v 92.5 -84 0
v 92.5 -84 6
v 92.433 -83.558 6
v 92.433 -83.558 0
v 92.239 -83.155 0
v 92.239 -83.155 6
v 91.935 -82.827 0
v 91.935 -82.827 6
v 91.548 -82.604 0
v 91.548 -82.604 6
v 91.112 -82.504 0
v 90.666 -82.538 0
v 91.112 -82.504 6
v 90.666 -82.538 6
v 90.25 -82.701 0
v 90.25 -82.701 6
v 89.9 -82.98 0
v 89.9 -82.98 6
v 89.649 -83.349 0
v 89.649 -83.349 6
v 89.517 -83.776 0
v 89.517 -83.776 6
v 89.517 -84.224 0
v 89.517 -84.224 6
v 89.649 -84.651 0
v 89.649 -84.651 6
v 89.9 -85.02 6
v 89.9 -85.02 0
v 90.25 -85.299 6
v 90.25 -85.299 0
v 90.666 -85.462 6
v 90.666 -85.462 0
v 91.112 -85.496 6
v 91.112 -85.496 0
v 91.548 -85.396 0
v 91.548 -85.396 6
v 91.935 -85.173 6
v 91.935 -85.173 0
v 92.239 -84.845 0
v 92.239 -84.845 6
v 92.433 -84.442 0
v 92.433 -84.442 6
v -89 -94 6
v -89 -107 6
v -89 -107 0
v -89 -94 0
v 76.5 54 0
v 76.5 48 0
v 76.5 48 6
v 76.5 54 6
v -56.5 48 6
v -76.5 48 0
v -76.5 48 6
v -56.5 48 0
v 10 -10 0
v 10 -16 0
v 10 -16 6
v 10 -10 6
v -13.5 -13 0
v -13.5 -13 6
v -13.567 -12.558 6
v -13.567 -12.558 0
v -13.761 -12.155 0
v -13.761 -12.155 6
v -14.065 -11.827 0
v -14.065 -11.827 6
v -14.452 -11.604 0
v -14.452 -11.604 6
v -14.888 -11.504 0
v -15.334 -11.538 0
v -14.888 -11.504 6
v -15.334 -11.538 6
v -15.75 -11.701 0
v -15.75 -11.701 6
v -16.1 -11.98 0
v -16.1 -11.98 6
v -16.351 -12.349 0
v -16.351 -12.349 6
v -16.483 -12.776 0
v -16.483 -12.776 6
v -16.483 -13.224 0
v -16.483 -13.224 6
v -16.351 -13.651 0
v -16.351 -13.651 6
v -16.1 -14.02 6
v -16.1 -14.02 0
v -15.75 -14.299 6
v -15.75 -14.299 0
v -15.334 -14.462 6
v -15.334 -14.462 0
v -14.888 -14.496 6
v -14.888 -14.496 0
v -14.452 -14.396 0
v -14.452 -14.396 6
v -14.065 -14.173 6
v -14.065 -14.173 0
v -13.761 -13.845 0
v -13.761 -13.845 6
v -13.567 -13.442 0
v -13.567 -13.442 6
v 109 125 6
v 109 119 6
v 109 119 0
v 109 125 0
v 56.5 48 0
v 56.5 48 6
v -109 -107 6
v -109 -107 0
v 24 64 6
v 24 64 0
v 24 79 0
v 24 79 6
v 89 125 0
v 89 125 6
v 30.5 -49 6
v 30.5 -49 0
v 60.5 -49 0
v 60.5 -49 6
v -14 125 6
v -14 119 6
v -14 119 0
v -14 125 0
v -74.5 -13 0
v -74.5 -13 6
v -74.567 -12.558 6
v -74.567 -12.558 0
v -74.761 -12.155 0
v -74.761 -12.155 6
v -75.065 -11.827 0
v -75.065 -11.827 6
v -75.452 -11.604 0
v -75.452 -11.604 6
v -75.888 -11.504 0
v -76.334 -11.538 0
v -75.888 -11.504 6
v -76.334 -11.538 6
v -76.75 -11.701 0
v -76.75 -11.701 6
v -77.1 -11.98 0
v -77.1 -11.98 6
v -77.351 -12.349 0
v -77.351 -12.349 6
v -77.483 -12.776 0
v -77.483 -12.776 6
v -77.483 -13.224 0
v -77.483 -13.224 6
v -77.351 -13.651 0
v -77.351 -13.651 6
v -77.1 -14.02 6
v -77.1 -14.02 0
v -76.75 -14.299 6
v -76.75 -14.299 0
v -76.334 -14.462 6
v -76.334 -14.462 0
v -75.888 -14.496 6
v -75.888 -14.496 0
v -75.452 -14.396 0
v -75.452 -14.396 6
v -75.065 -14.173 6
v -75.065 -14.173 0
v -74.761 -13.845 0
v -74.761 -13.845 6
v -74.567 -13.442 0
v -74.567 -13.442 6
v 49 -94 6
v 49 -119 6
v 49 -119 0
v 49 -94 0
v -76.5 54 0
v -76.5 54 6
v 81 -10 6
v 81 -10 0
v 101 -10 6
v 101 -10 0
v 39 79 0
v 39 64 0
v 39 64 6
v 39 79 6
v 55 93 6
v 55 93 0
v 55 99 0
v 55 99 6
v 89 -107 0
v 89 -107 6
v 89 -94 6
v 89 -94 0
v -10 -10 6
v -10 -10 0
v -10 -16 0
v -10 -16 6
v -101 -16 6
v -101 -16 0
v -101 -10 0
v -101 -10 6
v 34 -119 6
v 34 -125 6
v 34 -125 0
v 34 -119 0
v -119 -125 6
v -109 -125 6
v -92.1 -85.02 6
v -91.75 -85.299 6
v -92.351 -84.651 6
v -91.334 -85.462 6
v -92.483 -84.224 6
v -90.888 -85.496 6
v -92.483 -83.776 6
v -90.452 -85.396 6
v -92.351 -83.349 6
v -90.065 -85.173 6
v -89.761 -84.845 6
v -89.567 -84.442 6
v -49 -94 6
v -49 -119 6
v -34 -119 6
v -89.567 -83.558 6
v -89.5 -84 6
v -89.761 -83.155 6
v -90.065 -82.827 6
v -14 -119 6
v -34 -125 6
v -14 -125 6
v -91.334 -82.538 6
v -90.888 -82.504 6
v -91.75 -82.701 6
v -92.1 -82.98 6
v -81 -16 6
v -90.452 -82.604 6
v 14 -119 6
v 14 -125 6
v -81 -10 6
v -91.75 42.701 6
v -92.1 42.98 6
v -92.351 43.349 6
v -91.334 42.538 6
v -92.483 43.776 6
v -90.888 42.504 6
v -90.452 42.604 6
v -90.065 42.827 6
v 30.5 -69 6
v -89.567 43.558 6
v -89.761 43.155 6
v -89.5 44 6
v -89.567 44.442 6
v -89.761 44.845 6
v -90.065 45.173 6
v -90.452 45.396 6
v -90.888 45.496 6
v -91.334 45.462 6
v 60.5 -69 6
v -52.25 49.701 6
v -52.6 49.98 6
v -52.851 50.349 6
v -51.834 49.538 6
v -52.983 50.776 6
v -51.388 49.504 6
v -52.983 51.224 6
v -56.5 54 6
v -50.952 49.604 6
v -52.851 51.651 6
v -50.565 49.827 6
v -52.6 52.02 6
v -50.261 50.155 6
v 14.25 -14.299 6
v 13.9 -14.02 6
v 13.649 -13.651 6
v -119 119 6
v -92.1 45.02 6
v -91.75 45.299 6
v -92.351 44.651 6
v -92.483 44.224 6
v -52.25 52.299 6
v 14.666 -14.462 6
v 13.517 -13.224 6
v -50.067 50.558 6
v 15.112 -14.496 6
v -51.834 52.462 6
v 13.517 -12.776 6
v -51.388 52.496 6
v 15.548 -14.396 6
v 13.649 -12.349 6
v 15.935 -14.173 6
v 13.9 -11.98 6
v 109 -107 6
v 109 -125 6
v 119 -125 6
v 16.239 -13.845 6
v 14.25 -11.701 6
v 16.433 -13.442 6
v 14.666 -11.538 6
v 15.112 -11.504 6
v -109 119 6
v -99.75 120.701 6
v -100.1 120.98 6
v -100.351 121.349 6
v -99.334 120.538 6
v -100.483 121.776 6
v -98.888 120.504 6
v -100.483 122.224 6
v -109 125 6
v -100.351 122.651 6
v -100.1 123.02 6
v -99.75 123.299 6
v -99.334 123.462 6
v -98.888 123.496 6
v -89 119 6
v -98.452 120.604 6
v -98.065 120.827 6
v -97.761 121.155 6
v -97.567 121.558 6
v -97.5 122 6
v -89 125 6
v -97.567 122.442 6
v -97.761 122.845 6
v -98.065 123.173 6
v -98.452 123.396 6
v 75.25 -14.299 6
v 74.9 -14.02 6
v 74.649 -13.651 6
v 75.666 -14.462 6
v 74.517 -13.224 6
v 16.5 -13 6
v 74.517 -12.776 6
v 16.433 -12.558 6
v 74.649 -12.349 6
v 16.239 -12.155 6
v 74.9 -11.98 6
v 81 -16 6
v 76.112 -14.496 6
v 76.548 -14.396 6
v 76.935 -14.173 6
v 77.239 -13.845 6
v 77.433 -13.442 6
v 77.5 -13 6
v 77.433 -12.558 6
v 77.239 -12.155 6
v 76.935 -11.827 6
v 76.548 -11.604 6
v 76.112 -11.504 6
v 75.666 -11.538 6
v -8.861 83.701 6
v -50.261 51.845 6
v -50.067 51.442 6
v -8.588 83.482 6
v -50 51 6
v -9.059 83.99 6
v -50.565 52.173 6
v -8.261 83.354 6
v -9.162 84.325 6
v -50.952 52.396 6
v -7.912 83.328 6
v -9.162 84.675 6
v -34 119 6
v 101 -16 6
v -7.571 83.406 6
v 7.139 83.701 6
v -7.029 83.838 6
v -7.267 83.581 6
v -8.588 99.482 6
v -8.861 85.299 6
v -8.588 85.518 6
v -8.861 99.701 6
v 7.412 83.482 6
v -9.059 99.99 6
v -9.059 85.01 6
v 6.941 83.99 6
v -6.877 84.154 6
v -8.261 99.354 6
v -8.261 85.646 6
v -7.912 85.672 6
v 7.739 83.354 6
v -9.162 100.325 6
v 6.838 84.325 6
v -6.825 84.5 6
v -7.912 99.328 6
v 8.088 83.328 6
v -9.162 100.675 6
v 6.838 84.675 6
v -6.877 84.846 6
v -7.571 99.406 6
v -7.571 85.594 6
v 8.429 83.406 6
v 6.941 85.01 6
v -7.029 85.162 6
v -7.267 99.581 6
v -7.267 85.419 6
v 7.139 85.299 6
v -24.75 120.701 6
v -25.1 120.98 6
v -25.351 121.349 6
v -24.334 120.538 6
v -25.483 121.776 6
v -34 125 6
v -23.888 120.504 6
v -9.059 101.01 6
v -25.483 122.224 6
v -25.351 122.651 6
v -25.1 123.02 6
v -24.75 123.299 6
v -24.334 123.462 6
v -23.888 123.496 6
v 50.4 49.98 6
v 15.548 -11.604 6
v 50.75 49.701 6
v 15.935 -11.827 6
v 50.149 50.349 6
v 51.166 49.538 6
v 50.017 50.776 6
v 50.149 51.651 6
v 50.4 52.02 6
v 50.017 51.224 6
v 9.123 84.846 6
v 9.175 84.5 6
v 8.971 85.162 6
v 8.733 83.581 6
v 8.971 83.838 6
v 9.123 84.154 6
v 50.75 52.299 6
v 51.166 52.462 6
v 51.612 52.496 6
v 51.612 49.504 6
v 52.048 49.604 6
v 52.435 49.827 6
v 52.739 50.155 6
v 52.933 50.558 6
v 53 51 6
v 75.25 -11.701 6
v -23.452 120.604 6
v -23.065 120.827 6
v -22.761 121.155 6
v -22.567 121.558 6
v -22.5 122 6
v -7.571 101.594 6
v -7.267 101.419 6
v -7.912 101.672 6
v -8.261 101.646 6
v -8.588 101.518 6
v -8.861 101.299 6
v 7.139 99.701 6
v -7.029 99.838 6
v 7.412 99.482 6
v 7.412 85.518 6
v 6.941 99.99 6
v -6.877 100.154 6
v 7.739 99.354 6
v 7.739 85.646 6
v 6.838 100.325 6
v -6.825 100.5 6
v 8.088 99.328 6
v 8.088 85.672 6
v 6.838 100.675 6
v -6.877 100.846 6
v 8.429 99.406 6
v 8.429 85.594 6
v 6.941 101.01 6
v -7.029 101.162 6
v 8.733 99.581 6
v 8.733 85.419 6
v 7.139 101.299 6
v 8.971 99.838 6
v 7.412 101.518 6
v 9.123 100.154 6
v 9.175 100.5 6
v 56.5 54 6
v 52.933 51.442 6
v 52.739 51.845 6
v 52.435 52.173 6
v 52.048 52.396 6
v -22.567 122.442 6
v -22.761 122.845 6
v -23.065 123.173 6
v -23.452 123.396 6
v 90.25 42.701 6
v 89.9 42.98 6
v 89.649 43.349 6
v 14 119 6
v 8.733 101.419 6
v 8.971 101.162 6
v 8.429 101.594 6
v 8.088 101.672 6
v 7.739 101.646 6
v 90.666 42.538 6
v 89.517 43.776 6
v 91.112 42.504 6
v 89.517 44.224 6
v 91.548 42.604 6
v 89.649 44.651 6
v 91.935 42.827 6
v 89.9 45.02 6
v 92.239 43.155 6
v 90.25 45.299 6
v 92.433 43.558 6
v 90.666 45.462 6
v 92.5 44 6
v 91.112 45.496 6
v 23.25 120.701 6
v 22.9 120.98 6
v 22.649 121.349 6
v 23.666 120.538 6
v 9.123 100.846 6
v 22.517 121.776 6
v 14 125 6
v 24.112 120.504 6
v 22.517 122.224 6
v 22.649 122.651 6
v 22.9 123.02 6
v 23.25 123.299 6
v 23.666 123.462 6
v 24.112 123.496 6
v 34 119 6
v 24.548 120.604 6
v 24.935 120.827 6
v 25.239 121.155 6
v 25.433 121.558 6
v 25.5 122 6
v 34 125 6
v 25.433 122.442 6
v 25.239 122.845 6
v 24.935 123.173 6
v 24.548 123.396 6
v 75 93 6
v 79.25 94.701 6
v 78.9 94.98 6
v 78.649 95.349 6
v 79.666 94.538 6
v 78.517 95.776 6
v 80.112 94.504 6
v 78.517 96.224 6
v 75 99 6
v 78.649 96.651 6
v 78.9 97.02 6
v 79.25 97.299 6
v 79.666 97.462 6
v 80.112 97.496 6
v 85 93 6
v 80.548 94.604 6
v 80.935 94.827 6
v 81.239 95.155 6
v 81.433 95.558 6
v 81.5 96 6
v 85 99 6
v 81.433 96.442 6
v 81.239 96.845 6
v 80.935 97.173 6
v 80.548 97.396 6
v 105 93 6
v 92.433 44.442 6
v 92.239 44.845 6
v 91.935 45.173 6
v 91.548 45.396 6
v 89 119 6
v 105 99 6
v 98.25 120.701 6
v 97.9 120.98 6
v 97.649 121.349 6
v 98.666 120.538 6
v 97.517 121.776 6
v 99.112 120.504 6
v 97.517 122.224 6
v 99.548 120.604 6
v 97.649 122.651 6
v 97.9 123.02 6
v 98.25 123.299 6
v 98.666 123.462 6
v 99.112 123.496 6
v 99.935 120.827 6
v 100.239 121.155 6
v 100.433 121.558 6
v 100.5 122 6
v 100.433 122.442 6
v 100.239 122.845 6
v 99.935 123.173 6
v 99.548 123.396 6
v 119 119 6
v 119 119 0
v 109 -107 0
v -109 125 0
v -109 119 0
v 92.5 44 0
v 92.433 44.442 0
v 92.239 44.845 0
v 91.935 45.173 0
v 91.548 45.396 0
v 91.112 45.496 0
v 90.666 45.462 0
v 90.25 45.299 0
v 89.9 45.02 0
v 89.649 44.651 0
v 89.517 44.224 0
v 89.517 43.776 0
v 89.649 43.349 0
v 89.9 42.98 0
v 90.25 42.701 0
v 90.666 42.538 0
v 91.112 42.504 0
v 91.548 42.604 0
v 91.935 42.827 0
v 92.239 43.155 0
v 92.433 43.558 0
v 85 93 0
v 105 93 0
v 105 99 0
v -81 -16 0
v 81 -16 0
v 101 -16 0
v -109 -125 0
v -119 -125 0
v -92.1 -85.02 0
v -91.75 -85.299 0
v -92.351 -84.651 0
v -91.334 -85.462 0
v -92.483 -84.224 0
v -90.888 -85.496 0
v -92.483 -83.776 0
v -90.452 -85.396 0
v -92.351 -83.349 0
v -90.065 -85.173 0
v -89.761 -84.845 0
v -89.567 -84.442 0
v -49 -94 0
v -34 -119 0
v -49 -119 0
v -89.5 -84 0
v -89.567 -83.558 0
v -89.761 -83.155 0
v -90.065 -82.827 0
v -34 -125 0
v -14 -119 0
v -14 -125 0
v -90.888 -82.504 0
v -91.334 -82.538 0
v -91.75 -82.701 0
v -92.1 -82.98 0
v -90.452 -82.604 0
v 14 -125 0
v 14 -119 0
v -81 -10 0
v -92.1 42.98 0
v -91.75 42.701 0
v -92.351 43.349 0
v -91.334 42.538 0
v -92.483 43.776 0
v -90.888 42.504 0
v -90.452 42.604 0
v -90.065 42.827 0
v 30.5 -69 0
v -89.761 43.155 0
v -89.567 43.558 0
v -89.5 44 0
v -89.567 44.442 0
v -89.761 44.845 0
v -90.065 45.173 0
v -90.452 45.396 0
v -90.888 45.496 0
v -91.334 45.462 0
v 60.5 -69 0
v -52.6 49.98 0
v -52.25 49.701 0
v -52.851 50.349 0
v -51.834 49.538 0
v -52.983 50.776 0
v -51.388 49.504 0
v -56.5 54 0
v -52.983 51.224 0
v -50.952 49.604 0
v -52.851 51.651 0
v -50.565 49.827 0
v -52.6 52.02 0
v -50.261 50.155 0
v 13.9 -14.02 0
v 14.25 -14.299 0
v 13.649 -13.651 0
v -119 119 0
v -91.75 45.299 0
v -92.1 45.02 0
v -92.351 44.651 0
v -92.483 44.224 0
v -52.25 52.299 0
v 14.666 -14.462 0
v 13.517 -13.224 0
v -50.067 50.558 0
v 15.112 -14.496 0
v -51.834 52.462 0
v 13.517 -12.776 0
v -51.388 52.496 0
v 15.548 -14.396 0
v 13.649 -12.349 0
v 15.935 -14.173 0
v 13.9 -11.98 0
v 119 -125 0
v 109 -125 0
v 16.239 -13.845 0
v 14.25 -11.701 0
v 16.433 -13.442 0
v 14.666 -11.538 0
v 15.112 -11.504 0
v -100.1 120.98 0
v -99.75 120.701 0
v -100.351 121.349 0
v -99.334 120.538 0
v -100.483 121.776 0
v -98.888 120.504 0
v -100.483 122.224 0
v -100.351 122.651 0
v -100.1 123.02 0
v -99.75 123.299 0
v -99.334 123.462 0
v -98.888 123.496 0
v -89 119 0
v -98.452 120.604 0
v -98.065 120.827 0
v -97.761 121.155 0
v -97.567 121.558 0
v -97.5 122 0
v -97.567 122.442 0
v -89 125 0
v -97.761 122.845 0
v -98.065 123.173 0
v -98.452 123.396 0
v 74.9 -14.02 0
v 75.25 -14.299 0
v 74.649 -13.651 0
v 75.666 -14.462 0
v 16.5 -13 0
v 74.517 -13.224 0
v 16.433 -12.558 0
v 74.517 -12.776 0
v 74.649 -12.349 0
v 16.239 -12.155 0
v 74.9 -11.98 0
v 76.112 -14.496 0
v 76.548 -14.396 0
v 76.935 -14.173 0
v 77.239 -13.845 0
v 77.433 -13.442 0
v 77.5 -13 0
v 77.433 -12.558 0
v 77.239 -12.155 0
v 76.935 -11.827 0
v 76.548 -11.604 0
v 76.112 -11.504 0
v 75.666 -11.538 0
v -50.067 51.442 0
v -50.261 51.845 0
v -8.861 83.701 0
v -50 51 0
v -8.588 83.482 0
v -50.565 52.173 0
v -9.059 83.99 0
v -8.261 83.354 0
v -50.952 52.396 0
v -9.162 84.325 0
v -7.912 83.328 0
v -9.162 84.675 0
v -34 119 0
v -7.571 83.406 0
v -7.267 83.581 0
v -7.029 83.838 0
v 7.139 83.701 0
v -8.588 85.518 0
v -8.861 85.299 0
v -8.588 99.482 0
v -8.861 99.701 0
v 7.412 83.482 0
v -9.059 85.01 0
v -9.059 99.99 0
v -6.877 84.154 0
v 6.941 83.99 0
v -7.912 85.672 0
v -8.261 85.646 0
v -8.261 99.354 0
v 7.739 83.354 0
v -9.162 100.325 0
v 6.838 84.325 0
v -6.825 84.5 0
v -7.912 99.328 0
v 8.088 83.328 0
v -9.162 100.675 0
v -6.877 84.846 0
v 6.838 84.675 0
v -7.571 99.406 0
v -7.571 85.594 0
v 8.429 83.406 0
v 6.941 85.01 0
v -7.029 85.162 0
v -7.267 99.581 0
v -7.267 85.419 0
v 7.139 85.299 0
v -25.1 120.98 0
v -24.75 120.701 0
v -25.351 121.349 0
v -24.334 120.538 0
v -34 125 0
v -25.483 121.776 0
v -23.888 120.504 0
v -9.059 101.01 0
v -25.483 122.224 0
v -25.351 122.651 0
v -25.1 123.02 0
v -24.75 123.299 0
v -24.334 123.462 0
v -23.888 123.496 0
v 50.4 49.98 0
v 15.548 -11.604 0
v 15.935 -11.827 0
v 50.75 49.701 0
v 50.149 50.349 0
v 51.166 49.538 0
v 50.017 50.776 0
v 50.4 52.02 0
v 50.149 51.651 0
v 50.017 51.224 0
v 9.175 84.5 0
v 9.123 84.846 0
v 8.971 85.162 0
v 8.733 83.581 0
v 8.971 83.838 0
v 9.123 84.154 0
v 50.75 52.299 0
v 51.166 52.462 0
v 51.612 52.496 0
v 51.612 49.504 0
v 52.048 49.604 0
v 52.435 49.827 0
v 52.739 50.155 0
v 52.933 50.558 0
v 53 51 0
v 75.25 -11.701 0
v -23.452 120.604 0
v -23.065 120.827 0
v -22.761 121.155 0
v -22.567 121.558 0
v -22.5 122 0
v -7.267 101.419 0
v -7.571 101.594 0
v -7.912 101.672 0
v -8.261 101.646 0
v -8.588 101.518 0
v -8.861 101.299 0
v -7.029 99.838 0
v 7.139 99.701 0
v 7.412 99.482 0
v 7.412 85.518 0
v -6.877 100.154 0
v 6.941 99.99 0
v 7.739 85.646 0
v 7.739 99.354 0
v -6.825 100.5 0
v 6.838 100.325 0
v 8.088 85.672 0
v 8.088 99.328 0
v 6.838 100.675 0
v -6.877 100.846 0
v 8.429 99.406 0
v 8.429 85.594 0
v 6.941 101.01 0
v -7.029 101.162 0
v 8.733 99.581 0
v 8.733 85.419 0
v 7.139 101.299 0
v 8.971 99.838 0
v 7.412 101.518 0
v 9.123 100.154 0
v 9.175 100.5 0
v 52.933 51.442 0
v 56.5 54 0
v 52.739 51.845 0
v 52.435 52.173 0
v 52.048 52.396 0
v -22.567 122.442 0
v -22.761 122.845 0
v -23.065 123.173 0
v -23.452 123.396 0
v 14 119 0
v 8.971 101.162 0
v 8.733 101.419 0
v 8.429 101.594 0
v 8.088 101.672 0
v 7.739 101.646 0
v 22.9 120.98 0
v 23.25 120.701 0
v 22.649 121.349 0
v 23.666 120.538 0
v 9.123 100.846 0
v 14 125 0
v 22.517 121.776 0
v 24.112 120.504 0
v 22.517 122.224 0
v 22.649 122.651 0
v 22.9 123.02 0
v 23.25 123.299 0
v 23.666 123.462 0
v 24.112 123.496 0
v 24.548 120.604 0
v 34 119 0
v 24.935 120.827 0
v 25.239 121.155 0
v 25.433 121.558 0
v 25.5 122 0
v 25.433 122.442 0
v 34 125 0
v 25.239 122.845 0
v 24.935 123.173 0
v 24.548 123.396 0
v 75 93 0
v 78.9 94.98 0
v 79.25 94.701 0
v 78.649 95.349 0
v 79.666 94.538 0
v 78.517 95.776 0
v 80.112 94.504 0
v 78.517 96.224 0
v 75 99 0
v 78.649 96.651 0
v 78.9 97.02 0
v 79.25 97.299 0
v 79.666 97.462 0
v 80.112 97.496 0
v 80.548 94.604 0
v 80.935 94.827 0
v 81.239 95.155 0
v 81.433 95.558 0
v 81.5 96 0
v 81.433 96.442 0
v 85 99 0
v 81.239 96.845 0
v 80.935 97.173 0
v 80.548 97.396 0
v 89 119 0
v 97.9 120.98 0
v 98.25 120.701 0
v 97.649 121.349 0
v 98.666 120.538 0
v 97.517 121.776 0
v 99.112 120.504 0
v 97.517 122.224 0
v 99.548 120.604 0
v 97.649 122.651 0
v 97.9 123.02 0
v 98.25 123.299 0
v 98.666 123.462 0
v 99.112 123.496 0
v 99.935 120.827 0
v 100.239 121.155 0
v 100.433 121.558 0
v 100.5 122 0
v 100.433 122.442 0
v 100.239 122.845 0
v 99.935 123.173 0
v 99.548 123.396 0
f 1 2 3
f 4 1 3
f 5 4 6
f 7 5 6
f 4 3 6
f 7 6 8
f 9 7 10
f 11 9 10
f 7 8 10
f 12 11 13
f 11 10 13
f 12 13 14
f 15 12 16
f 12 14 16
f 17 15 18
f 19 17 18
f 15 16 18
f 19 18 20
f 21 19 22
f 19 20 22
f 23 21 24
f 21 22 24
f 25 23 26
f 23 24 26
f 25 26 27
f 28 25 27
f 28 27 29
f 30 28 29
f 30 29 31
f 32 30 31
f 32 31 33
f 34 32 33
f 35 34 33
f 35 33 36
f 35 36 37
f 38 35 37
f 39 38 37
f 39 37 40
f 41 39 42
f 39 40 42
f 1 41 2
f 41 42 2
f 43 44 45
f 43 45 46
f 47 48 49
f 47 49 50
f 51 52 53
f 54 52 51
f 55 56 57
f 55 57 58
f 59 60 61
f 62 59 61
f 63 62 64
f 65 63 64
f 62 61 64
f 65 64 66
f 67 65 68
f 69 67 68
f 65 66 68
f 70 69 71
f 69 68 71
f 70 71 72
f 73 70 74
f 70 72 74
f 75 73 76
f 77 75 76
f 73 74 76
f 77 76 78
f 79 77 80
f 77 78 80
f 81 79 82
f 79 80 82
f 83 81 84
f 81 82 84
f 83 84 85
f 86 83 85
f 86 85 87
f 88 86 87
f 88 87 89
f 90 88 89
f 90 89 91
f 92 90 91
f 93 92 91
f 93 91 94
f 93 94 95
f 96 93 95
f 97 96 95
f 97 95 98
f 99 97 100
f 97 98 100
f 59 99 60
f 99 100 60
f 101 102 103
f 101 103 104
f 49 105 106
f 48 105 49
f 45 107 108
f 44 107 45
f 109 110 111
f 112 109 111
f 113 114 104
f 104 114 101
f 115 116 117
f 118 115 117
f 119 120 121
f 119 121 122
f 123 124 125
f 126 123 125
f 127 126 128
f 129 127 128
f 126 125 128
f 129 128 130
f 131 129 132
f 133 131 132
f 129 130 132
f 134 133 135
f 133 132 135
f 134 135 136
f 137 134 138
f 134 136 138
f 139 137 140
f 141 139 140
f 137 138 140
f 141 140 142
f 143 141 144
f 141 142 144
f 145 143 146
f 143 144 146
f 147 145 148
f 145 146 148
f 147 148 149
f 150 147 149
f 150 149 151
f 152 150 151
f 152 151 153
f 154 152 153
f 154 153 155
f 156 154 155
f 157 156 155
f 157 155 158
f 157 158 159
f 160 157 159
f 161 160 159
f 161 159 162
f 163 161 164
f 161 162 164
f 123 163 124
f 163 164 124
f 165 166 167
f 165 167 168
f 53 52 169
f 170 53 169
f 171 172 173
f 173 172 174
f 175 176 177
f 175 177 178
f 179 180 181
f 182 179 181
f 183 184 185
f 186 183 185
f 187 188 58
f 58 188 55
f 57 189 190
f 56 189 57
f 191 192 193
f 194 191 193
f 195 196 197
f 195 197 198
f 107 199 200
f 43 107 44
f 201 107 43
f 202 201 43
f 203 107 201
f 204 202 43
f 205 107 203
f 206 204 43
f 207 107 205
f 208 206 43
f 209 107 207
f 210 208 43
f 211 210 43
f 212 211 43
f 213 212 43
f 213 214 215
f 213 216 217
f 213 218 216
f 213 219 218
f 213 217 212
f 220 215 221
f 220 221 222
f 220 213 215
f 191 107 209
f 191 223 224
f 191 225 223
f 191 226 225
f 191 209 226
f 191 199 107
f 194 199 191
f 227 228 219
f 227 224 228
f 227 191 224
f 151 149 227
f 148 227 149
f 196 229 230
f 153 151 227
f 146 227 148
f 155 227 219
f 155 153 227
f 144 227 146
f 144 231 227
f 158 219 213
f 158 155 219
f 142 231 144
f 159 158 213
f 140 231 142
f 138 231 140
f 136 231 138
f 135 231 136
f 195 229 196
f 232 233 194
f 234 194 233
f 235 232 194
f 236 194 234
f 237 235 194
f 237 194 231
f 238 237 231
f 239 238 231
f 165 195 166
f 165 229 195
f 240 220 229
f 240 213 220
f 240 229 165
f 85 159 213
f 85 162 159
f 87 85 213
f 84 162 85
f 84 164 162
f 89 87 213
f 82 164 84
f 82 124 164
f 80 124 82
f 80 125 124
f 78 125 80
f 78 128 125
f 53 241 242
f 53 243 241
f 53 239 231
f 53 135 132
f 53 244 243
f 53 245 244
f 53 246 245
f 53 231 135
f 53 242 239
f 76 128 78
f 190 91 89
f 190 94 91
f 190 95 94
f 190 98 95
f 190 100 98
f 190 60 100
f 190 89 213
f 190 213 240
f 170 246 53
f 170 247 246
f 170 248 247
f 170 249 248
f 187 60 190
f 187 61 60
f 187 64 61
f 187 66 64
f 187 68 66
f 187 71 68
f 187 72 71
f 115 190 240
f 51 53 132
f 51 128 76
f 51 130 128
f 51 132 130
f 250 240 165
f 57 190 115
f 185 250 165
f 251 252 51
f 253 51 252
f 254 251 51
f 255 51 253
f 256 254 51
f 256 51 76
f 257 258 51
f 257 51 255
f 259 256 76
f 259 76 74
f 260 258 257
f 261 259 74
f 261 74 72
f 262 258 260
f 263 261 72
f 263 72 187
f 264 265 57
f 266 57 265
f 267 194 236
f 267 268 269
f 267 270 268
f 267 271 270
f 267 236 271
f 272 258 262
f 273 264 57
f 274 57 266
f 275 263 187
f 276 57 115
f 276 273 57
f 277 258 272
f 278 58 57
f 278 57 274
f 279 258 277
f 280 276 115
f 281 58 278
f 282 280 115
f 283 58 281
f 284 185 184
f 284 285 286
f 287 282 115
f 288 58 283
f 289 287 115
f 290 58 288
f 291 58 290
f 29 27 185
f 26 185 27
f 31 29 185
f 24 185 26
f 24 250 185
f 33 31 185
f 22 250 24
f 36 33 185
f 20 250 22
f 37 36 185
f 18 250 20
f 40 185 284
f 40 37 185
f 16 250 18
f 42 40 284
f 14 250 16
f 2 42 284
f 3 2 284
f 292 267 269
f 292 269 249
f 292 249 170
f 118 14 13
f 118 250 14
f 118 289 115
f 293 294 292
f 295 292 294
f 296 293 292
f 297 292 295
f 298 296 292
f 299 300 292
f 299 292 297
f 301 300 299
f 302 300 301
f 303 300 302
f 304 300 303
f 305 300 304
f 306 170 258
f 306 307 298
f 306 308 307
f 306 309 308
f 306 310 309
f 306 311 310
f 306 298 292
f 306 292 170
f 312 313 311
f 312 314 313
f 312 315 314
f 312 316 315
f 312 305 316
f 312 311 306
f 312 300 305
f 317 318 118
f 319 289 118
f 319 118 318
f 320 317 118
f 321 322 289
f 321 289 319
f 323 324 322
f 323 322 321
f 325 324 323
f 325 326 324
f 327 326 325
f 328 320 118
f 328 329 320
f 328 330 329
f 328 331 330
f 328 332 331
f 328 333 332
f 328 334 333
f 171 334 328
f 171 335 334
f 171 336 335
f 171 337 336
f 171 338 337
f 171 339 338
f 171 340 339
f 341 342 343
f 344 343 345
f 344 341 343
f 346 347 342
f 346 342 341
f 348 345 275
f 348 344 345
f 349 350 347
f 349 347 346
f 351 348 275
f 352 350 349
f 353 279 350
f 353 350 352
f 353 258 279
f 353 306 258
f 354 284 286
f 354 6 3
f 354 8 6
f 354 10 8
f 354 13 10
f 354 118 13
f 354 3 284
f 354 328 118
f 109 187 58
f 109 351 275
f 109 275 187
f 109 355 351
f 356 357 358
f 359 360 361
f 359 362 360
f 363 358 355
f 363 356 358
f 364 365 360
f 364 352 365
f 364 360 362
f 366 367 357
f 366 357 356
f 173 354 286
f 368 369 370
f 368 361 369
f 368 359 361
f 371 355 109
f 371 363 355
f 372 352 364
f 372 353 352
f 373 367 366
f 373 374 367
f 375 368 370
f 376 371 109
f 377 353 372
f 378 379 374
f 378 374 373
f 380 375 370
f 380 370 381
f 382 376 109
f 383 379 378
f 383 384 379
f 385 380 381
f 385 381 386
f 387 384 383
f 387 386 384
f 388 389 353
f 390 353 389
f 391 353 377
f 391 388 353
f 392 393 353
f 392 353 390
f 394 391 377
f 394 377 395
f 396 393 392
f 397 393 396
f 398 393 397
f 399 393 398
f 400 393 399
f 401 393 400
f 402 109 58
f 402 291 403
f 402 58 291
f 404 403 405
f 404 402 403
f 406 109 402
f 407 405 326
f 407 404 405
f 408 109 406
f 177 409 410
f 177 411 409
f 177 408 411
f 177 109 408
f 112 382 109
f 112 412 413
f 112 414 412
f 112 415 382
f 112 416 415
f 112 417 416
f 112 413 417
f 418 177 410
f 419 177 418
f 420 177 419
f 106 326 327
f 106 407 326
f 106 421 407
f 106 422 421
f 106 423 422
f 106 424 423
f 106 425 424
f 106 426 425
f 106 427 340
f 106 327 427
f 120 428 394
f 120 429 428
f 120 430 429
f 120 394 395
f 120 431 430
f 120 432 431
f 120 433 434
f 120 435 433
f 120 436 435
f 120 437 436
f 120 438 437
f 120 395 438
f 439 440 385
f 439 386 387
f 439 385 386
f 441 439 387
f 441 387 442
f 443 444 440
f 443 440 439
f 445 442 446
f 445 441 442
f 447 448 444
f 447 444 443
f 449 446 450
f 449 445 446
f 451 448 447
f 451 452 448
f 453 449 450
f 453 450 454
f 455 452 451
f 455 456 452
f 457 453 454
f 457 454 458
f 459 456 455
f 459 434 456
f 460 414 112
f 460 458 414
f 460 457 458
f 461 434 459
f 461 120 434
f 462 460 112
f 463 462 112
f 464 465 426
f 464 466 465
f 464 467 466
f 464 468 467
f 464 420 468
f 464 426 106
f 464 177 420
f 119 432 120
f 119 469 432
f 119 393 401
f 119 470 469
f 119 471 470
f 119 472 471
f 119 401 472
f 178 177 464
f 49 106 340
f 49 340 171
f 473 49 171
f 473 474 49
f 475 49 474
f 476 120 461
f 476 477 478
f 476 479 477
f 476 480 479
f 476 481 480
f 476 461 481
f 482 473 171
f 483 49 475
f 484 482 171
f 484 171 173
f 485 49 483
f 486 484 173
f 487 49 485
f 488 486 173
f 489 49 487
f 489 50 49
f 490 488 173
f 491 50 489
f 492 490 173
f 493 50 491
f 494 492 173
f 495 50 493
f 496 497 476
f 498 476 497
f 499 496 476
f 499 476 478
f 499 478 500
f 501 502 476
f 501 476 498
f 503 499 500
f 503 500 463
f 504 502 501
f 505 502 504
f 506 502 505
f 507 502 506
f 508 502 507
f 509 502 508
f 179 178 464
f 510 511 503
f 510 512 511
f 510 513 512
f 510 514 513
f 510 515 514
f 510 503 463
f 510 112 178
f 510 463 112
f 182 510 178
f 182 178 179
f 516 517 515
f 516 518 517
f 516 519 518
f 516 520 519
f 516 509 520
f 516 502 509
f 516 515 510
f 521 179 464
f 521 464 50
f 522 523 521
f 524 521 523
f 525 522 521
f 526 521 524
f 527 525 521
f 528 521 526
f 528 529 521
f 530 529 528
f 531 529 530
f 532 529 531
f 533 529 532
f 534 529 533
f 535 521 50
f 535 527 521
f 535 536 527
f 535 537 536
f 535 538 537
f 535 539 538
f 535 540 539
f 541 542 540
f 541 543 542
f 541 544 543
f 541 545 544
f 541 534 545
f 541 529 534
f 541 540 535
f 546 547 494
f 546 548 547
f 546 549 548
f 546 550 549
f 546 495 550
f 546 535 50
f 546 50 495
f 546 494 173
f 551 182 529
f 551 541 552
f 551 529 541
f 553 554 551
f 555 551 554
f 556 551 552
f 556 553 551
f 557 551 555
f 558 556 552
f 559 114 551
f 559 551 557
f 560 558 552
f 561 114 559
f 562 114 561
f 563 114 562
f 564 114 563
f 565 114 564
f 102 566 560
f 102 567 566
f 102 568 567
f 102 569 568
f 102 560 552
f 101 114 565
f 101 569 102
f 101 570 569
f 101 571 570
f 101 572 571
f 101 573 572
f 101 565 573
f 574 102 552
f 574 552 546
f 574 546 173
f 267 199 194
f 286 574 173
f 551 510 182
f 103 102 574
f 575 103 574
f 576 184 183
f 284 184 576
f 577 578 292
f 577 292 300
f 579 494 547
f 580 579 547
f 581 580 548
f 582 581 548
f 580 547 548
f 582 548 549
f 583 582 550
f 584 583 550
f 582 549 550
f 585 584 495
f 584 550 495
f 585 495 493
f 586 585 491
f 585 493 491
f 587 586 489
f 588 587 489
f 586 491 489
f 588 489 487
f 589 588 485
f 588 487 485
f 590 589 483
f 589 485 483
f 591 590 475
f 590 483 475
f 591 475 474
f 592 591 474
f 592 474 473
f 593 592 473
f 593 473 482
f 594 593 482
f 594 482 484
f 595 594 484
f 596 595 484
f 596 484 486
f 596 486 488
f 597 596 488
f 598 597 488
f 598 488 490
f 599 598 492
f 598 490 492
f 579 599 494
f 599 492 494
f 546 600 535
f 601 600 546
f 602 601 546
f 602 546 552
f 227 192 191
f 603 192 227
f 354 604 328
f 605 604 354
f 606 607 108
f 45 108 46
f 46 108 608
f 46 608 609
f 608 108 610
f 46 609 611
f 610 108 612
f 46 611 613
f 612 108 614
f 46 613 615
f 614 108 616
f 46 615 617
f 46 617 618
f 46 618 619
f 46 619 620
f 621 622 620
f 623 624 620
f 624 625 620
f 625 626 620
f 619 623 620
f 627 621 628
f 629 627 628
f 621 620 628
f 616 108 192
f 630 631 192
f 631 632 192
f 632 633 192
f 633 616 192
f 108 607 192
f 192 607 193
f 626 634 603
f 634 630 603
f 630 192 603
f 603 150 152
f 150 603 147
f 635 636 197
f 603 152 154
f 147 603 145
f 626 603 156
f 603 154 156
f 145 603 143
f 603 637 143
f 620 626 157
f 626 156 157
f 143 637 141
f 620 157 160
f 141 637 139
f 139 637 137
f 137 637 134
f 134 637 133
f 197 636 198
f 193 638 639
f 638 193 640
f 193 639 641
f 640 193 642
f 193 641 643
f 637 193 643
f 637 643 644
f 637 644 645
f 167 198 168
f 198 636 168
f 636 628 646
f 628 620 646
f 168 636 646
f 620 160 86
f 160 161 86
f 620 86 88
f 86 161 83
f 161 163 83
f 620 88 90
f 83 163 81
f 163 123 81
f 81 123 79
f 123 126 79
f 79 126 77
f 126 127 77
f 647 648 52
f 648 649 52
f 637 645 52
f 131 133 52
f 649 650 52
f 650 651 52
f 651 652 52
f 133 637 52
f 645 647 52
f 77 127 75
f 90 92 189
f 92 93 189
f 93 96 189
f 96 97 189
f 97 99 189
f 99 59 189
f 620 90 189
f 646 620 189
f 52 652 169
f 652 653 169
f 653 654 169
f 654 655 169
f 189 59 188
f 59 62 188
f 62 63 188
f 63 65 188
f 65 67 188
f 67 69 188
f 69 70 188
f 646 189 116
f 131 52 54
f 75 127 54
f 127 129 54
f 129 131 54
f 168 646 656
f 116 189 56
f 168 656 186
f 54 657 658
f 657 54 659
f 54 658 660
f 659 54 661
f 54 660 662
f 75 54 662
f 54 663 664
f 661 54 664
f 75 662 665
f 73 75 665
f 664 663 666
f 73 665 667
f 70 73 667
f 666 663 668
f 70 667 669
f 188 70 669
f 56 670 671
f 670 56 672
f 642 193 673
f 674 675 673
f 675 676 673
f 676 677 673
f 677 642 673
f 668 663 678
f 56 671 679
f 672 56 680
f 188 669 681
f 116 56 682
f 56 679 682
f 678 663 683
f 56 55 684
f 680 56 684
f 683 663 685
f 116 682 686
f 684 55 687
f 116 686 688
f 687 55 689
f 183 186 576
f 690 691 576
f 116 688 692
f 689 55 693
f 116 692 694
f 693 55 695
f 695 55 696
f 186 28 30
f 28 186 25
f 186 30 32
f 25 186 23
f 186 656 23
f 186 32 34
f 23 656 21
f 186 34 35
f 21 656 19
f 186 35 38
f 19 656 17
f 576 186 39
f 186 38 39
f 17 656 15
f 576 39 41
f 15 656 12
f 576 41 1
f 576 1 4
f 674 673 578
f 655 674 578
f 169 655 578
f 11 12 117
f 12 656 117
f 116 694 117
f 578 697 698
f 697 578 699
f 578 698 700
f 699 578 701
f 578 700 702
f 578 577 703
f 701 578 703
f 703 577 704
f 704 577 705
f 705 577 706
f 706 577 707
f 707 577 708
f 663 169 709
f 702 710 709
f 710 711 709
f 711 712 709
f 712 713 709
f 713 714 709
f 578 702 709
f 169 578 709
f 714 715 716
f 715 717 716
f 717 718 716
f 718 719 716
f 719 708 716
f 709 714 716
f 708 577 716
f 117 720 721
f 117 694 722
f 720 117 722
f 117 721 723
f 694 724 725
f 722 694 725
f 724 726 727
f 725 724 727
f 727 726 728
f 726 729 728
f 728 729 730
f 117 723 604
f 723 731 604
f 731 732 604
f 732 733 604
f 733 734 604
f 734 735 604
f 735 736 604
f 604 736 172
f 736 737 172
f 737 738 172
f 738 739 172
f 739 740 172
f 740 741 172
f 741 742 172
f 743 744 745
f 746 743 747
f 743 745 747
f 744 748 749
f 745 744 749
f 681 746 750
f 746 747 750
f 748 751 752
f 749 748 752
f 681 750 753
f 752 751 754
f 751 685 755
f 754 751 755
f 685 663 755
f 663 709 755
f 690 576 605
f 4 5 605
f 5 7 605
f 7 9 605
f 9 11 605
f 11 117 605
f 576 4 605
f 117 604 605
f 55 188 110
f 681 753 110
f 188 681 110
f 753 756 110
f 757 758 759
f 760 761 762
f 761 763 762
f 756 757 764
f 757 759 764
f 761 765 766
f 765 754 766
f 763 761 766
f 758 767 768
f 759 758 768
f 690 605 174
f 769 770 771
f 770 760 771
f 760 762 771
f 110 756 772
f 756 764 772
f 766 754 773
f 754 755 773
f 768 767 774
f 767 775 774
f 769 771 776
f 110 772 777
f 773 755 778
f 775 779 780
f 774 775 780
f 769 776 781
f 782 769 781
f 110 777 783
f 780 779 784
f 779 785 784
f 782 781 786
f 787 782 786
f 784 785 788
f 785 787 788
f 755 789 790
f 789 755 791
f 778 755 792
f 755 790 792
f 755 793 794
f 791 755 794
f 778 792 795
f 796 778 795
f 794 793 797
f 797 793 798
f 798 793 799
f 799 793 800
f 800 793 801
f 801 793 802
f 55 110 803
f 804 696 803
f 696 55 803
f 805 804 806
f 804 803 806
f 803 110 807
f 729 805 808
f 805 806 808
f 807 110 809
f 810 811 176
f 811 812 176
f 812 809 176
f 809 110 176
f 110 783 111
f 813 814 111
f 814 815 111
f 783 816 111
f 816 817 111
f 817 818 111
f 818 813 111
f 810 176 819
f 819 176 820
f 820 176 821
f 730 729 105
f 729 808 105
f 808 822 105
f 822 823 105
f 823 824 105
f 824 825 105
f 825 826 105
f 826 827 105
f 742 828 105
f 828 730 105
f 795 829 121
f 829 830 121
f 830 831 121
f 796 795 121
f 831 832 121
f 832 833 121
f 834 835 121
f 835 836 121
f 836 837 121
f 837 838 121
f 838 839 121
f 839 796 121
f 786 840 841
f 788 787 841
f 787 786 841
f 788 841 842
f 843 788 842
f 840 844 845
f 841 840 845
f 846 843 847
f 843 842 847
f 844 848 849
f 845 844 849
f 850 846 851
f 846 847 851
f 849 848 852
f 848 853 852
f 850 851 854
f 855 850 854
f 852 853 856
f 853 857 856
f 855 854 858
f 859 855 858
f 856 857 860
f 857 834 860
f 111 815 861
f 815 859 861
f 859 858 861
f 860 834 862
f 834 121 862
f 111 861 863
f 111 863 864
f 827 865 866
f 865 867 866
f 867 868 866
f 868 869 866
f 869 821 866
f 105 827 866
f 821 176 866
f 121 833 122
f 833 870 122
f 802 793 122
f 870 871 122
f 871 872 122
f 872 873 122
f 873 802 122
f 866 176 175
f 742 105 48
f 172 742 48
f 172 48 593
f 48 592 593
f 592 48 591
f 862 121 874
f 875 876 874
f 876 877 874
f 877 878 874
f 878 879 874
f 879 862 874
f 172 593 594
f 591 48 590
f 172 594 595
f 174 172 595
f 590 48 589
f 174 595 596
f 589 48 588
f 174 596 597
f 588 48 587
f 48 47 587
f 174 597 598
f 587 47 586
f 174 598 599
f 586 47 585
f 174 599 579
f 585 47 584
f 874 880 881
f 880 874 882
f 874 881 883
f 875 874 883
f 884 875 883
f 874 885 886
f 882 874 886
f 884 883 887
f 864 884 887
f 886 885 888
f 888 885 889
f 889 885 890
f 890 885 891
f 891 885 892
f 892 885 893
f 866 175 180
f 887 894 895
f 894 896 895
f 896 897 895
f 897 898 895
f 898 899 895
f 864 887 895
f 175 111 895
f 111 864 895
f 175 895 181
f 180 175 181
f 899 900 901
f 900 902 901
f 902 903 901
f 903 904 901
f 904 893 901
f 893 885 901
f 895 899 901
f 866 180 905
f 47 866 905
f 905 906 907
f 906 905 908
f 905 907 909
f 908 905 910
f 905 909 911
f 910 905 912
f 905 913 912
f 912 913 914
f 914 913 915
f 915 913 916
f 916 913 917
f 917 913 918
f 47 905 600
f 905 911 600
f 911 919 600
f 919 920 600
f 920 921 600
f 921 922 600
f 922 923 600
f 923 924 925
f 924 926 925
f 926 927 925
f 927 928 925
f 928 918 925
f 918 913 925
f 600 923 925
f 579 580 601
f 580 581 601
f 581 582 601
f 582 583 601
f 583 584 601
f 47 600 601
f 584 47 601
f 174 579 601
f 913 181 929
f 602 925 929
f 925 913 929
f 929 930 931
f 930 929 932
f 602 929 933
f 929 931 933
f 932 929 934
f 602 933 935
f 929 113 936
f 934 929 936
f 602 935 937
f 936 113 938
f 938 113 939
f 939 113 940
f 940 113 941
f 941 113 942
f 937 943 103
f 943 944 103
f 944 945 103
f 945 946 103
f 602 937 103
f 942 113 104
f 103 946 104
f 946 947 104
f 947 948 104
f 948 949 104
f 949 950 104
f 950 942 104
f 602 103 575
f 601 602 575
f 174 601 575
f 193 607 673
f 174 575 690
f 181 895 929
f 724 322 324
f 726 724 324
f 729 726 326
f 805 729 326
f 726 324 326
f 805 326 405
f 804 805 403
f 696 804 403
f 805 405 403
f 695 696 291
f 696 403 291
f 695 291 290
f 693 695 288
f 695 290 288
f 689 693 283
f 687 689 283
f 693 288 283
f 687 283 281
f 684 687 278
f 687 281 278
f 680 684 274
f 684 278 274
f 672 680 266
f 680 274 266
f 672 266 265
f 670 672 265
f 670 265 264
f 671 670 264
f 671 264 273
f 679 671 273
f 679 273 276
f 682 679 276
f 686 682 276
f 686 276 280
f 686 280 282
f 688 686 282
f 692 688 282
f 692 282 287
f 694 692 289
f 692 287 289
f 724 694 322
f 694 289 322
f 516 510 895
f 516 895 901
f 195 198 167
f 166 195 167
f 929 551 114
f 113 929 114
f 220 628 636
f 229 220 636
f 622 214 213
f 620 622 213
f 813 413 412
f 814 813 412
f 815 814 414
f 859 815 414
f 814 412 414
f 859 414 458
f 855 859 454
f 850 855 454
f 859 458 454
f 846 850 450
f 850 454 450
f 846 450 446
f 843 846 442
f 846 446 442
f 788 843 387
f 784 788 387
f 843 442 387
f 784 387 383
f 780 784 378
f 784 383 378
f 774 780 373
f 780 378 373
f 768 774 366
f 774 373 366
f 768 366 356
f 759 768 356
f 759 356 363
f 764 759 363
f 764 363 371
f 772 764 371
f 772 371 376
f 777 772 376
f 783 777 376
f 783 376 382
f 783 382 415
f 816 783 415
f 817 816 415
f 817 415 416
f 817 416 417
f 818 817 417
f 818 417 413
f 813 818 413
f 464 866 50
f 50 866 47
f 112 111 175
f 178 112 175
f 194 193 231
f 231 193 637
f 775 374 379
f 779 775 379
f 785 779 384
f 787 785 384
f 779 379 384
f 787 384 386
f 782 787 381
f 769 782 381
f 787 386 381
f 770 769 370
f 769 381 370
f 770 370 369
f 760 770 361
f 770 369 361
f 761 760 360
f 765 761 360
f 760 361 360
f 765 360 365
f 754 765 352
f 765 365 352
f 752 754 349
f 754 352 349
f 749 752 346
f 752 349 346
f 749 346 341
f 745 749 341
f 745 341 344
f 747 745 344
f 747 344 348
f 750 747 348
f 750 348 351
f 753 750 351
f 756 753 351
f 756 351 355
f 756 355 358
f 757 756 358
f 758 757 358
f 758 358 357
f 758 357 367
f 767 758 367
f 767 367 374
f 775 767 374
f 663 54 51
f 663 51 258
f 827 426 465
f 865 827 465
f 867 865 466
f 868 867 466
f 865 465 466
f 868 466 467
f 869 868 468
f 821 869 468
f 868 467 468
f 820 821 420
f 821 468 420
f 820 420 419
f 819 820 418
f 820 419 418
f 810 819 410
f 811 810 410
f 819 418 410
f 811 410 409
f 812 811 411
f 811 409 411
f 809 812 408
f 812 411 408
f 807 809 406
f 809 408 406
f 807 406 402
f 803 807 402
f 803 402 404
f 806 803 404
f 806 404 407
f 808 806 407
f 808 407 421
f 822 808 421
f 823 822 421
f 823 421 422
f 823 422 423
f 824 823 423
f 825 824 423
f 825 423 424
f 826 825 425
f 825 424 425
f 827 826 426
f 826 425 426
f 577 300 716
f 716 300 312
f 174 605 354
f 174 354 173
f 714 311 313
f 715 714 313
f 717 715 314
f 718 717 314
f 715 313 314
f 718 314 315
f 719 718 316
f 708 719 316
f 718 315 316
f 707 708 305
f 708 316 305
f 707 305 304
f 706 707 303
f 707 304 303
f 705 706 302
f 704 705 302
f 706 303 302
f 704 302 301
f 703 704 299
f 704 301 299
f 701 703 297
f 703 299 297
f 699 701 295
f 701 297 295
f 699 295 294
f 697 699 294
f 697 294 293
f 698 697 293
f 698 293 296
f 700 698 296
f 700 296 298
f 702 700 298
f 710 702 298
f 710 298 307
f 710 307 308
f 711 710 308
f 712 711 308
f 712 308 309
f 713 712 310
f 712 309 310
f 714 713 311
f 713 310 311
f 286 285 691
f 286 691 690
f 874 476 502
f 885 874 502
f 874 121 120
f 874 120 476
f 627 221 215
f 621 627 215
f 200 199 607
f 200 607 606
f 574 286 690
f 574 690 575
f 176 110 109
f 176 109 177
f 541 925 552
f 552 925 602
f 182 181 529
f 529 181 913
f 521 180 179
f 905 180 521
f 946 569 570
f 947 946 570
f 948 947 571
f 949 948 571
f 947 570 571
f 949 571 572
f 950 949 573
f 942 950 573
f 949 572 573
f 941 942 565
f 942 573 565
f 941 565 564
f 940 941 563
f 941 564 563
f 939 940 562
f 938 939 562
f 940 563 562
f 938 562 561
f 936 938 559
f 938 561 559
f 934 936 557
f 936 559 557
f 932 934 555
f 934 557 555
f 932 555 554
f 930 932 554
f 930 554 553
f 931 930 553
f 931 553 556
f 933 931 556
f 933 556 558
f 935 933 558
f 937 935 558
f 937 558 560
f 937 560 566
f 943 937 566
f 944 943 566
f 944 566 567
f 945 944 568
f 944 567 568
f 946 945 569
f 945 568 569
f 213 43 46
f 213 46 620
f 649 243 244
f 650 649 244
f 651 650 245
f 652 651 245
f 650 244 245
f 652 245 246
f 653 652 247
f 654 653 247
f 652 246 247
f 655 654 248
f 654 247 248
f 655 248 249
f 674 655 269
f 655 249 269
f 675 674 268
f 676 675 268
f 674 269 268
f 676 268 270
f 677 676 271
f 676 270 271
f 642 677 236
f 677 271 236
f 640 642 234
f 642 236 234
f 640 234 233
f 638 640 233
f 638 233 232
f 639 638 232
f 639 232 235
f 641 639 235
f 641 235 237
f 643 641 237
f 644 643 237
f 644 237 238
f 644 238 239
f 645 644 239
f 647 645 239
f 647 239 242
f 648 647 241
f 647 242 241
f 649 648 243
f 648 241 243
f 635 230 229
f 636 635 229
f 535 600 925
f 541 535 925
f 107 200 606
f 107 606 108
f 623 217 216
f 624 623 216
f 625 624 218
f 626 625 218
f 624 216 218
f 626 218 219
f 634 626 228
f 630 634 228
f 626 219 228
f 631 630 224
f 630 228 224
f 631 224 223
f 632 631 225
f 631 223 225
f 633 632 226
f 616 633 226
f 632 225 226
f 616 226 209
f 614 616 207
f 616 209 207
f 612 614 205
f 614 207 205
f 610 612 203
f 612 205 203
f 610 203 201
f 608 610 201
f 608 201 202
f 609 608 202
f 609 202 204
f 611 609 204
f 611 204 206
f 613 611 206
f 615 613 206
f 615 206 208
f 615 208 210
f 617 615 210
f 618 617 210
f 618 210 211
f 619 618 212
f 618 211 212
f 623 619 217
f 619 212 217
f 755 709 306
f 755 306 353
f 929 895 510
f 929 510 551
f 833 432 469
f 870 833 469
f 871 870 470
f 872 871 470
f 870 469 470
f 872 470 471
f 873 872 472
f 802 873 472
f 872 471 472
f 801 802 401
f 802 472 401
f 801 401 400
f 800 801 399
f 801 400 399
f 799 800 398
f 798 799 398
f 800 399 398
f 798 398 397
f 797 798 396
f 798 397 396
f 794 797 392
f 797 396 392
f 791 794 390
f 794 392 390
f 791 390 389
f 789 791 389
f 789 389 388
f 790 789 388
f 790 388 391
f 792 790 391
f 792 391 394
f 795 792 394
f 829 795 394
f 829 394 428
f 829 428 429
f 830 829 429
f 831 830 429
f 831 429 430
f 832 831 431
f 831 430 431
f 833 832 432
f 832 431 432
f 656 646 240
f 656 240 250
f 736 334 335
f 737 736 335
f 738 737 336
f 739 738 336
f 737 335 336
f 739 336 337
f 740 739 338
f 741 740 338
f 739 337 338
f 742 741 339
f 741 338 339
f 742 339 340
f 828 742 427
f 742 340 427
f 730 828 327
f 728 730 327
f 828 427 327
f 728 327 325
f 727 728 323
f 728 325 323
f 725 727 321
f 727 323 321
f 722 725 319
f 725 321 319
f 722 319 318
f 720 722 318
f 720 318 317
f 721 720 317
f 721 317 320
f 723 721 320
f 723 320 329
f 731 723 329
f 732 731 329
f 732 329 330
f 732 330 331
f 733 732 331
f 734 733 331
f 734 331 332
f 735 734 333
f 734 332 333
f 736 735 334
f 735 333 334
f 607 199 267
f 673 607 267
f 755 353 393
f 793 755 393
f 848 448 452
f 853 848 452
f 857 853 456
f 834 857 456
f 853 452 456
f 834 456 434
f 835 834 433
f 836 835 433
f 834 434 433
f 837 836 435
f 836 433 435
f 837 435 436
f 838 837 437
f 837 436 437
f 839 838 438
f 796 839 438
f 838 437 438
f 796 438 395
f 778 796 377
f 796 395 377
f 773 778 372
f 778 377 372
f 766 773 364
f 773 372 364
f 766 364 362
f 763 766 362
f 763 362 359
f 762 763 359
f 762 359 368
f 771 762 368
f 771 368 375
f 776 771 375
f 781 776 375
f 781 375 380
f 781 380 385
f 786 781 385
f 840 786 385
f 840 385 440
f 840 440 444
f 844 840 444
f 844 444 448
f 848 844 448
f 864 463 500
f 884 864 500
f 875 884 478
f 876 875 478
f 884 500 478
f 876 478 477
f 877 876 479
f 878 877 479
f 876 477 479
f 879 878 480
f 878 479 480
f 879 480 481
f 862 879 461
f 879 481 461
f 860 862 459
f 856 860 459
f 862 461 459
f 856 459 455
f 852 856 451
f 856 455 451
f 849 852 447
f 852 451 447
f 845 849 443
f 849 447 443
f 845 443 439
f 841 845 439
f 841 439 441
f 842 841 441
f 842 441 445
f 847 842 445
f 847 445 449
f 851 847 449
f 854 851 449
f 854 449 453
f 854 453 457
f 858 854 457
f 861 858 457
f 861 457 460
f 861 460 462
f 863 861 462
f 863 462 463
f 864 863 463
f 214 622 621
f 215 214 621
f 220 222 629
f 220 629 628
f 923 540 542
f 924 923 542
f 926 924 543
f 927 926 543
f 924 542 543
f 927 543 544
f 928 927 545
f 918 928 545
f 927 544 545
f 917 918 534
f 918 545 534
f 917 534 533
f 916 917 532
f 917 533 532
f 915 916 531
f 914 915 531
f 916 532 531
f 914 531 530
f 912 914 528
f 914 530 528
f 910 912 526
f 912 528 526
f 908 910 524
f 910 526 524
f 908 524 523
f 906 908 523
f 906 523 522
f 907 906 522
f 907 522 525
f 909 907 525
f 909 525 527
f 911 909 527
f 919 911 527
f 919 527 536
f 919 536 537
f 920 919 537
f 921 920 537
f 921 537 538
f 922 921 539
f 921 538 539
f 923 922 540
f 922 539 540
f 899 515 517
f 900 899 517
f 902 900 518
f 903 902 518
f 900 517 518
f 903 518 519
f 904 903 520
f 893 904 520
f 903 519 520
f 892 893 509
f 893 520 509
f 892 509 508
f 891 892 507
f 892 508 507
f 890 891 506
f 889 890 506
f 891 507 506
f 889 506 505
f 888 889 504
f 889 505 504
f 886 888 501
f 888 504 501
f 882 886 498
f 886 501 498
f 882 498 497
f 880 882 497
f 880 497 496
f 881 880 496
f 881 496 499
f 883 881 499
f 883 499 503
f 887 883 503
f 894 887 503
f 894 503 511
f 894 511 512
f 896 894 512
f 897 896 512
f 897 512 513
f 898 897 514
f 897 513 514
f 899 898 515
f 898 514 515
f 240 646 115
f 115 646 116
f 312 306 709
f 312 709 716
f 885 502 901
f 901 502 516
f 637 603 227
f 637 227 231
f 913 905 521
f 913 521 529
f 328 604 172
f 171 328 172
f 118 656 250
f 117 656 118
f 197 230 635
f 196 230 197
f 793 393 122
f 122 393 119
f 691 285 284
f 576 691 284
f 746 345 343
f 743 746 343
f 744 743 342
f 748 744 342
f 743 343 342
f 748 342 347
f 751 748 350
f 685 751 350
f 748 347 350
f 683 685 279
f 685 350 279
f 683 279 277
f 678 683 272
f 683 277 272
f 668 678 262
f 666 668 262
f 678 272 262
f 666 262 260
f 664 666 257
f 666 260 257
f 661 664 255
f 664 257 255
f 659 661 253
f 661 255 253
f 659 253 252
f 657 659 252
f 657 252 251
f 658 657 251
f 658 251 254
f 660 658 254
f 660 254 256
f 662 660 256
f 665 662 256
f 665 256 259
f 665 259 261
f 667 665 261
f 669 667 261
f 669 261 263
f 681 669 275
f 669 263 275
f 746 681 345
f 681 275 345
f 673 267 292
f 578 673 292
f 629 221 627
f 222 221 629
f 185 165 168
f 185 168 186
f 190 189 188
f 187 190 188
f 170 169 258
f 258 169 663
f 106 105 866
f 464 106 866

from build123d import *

# Parameters (mm, degrees)
ESQUISSE1_W             = 218
ESQUISSE1_H             = 238
ESQUISSE1_W_2           = 20
ESQUISSE1_H_2           = 6
ESQUISSE1_W_3           = 30
ESQUISSE1_H_3           = 20
ESQUISSE1_W_4           = 15
ESQUISSE1_H_4           = 15
BOSS_EXTRU_1_DEPTH      = 6
ESQUISSE2_W             = 40
ESQUISSE2_H             = 25
ENL_V_MAT_EXTRU_1_DEPTH = 6
ESQUISSE3_W             = 20
ESQUISSE3_H             = 6
BOSS_EXTRU_3_DEPTH      = 6
ESQUISSE4_R             = 1.5
ENL_V_MAT_EXTRU_2_DEPTH = 6
ESQUISSE5_W             = 10
ESQUISSE5_H             = 244
BOSS_EXTRU_4_DEPTH      = 6
ESQUISSE6_W             = 20
ESQUISSE6_H             = 12
ENL_V_MAT_EXTRU_3_DEPTH = 6
ESQUISSE7_R             = 1.175
ENL_V_MAT_EXTRU_4_DEPTH = 7


with BuildPart() as part:
    # Esquisse1 → Boss.-Extru.1 (new body)
    with BuildSketch(Plane.XY):
        Rectangle(ESQUISSE1_W, ESQUISSE1_H)
        with Locations((-91, -13)):
            Rectangle(ESQUISSE1_W_2, ESQUISSE1_H_2, mode=Mode.SUBTRACT)
        with Locations((0, -13)):
            Rectangle(ESQUISSE1_W_2, ESQUISSE1_H_2, mode=Mode.SUBTRACT)
        with Locations((91, -13)):
            Rectangle(ESQUISSE1_W_2, ESQUISSE1_H_2, mode=Mode.SUBTRACT)
        with Locations((-66.5, 51)):
            Rectangle(ESQUISSE1_W_2, ESQUISSE1_H_2, mode=Mode.SUBTRACT)
        with Locations((66.5, 51)):
            Rectangle(ESQUISSE1_W_2, ESQUISSE1_H_2, mode=Mode.SUBTRACT)
        with Locations((45.5, -59)):
            Rectangle(ESQUISSE1_W_3, ESQUISSE1_H_3, mode=Mode.SUBTRACT)
        with Locations((65, 96)):
            Rectangle(ESQUISSE1_W_2, ESQUISSE1_H_2, mode=Mode.SUBTRACT)
        with Locations((95, 96)):
            Rectangle(ESQUISSE1_W_2, ESQUISSE1_H_2, mode=Mode.SUBTRACT)
        with Locations((31.5, 71.5)):
            Rectangle(ESQUISSE1_W_4, ESQUISSE1_H_4, mode=Mode.SUBTRACT)
    extrude(amount=BOSS_EXTRU_1_DEPTH)

    # Esquisse2 → Enlèv. mat.-Extru.1 (cut)
    with BuildSketch(Plane.XY.offset(6)):
        with Locations((-69, -106.5)):
            Rectangle(ESQUISSE2_W, ESQUISSE2_H)
        with Locations((69, -106.5)):
            Rectangle(ESQUISSE2_W, ESQUISSE2_H)
    extrude(amount=-ENL_V_MAT_EXTRU_1_DEPTH, mode=Mode.SUBTRACT)

    # Esquisse3 → Boss.-Extru.3 (add)
    with BuildSketch(Plane.XY.offset(6)):
        with Locations((-24, -122)):
            Rectangle(ESQUISSE3_W, ESQUISSE3_H)
        with Locations((24, -122)):
            Rectangle(ESQUISSE3_W, ESQUISSE3_H)
        with Locations((24, 122)):
            Rectangle(ESQUISSE3_W, ESQUISSE3_H)
        with Locations((99, 122)):
            Rectangle(ESQUISSE3_W, ESQUISSE3_H)
        with Locations((-24, 122)):
            Rectangle(ESQUISSE3_W, ESQUISSE3_H)
        with Locations((-99, 122)):
            Rectangle(ESQUISSE3_W, ESQUISSE3_H)
    extrude(amount=-BOSS_EXTRU_3_DEPTH)

    # Esquisse4 → Enlèv. mat.-Extru.2 (cut)
    with BuildSketch(Plane.XY.offset(6)):
        with Locations((-15, -13)):
            Circle(ESQUISSE4_R)
        with Locations((-76, -13)):
            Circle(ESQUISSE4_R)
        with Locations((80, 96)):
            Circle(ESQUISSE4_R)
        with Locations((51.5, 51)):
            Circle(ESQUISSE4_R)
        with Locations((76, -13)):
            Circle(ESQUISSE4_R)
        with Locations((15, -13)):
            Circle(ESQUISSE4_R)
        with Locations((-51.5, 51)):
            Circle(ESQUISSE4_R)
        with Locations((-99, 122)):
            Circle(ESQUISSE4_R)
        with Locations((-24, 122)):
            Circle(ESQUISSE4_R)
        with Locations((24, 122)):
            Circle(ESQUISSE4_R)
        with Locations((99, 122)):
            Circle(ESQUISSE4_R)
        with Locations((-91, -84)):
            Circle(ESQUISSE4_R)
        with Locations((-91, 44)):
            Circle(ESQUISSE4_R)
        with Locations((91, -84)):
            Circle(ESQUISSE4_R)
        with Locations((91, 44)):
            Circle(ESQUISSE4_R)
    extrude(amount=-ENL_V_MAT_EXTRU_2_DEPTH, mode=Mode.SUBTRACT)

    # Esquisse5 → Boss.-Extru.4 (add)
    with BuildSketch(Plane.XY.offset(6)):
        with Locations((-114, -3)):
            Rectangle(ESQUISSE5_W, ESQUISSE5_H)
        with Locations((114, -3)):
            Rectangle(ESQUISSE5_W, ESQUISSE5_H)
    extrude(amount=-BOSS_EXTRU_4_DEPTH)

    # Esquisse6 → Enlèv. mat.-Extru.3 (cut)
    with BuildSketch(Plane.XY.offset(6)):
        with Locations((99, -113)):
            Rectangle(ESQUISSE6_W, ESQUISSE6_H)
        with Locations((-99, -113)):
            Rectangle(ESQUISSE6_W, ESQUISSE6_H)
    extrude(amount=-ENL_V_MAT_EXTRU_3_DEPTH, mode=Mode.SUBTRACT)

    # Esquisse7 → Enlèv. mat.-Extru.4 (cut, through all)
    with BuildSketch(Plane.XY.offset(6)):
        with Locations((-8, 100.5)):
            Circle(ESQUISSE7_R)
        with Locations((8, 100.5)):
            Circle(ESQUISSE7_R)
        with Locations((-8, 84.5)):
            Circle(ESQUISSE7_R)
        with Locations((8, 84.5)):
            Circle(ESQUISSE7_R)
    extrude(amount=-ENL_V_MAT_EXTRU_4_DEPTH, mode=Mode.SUBTRACT)


solid = part.part
